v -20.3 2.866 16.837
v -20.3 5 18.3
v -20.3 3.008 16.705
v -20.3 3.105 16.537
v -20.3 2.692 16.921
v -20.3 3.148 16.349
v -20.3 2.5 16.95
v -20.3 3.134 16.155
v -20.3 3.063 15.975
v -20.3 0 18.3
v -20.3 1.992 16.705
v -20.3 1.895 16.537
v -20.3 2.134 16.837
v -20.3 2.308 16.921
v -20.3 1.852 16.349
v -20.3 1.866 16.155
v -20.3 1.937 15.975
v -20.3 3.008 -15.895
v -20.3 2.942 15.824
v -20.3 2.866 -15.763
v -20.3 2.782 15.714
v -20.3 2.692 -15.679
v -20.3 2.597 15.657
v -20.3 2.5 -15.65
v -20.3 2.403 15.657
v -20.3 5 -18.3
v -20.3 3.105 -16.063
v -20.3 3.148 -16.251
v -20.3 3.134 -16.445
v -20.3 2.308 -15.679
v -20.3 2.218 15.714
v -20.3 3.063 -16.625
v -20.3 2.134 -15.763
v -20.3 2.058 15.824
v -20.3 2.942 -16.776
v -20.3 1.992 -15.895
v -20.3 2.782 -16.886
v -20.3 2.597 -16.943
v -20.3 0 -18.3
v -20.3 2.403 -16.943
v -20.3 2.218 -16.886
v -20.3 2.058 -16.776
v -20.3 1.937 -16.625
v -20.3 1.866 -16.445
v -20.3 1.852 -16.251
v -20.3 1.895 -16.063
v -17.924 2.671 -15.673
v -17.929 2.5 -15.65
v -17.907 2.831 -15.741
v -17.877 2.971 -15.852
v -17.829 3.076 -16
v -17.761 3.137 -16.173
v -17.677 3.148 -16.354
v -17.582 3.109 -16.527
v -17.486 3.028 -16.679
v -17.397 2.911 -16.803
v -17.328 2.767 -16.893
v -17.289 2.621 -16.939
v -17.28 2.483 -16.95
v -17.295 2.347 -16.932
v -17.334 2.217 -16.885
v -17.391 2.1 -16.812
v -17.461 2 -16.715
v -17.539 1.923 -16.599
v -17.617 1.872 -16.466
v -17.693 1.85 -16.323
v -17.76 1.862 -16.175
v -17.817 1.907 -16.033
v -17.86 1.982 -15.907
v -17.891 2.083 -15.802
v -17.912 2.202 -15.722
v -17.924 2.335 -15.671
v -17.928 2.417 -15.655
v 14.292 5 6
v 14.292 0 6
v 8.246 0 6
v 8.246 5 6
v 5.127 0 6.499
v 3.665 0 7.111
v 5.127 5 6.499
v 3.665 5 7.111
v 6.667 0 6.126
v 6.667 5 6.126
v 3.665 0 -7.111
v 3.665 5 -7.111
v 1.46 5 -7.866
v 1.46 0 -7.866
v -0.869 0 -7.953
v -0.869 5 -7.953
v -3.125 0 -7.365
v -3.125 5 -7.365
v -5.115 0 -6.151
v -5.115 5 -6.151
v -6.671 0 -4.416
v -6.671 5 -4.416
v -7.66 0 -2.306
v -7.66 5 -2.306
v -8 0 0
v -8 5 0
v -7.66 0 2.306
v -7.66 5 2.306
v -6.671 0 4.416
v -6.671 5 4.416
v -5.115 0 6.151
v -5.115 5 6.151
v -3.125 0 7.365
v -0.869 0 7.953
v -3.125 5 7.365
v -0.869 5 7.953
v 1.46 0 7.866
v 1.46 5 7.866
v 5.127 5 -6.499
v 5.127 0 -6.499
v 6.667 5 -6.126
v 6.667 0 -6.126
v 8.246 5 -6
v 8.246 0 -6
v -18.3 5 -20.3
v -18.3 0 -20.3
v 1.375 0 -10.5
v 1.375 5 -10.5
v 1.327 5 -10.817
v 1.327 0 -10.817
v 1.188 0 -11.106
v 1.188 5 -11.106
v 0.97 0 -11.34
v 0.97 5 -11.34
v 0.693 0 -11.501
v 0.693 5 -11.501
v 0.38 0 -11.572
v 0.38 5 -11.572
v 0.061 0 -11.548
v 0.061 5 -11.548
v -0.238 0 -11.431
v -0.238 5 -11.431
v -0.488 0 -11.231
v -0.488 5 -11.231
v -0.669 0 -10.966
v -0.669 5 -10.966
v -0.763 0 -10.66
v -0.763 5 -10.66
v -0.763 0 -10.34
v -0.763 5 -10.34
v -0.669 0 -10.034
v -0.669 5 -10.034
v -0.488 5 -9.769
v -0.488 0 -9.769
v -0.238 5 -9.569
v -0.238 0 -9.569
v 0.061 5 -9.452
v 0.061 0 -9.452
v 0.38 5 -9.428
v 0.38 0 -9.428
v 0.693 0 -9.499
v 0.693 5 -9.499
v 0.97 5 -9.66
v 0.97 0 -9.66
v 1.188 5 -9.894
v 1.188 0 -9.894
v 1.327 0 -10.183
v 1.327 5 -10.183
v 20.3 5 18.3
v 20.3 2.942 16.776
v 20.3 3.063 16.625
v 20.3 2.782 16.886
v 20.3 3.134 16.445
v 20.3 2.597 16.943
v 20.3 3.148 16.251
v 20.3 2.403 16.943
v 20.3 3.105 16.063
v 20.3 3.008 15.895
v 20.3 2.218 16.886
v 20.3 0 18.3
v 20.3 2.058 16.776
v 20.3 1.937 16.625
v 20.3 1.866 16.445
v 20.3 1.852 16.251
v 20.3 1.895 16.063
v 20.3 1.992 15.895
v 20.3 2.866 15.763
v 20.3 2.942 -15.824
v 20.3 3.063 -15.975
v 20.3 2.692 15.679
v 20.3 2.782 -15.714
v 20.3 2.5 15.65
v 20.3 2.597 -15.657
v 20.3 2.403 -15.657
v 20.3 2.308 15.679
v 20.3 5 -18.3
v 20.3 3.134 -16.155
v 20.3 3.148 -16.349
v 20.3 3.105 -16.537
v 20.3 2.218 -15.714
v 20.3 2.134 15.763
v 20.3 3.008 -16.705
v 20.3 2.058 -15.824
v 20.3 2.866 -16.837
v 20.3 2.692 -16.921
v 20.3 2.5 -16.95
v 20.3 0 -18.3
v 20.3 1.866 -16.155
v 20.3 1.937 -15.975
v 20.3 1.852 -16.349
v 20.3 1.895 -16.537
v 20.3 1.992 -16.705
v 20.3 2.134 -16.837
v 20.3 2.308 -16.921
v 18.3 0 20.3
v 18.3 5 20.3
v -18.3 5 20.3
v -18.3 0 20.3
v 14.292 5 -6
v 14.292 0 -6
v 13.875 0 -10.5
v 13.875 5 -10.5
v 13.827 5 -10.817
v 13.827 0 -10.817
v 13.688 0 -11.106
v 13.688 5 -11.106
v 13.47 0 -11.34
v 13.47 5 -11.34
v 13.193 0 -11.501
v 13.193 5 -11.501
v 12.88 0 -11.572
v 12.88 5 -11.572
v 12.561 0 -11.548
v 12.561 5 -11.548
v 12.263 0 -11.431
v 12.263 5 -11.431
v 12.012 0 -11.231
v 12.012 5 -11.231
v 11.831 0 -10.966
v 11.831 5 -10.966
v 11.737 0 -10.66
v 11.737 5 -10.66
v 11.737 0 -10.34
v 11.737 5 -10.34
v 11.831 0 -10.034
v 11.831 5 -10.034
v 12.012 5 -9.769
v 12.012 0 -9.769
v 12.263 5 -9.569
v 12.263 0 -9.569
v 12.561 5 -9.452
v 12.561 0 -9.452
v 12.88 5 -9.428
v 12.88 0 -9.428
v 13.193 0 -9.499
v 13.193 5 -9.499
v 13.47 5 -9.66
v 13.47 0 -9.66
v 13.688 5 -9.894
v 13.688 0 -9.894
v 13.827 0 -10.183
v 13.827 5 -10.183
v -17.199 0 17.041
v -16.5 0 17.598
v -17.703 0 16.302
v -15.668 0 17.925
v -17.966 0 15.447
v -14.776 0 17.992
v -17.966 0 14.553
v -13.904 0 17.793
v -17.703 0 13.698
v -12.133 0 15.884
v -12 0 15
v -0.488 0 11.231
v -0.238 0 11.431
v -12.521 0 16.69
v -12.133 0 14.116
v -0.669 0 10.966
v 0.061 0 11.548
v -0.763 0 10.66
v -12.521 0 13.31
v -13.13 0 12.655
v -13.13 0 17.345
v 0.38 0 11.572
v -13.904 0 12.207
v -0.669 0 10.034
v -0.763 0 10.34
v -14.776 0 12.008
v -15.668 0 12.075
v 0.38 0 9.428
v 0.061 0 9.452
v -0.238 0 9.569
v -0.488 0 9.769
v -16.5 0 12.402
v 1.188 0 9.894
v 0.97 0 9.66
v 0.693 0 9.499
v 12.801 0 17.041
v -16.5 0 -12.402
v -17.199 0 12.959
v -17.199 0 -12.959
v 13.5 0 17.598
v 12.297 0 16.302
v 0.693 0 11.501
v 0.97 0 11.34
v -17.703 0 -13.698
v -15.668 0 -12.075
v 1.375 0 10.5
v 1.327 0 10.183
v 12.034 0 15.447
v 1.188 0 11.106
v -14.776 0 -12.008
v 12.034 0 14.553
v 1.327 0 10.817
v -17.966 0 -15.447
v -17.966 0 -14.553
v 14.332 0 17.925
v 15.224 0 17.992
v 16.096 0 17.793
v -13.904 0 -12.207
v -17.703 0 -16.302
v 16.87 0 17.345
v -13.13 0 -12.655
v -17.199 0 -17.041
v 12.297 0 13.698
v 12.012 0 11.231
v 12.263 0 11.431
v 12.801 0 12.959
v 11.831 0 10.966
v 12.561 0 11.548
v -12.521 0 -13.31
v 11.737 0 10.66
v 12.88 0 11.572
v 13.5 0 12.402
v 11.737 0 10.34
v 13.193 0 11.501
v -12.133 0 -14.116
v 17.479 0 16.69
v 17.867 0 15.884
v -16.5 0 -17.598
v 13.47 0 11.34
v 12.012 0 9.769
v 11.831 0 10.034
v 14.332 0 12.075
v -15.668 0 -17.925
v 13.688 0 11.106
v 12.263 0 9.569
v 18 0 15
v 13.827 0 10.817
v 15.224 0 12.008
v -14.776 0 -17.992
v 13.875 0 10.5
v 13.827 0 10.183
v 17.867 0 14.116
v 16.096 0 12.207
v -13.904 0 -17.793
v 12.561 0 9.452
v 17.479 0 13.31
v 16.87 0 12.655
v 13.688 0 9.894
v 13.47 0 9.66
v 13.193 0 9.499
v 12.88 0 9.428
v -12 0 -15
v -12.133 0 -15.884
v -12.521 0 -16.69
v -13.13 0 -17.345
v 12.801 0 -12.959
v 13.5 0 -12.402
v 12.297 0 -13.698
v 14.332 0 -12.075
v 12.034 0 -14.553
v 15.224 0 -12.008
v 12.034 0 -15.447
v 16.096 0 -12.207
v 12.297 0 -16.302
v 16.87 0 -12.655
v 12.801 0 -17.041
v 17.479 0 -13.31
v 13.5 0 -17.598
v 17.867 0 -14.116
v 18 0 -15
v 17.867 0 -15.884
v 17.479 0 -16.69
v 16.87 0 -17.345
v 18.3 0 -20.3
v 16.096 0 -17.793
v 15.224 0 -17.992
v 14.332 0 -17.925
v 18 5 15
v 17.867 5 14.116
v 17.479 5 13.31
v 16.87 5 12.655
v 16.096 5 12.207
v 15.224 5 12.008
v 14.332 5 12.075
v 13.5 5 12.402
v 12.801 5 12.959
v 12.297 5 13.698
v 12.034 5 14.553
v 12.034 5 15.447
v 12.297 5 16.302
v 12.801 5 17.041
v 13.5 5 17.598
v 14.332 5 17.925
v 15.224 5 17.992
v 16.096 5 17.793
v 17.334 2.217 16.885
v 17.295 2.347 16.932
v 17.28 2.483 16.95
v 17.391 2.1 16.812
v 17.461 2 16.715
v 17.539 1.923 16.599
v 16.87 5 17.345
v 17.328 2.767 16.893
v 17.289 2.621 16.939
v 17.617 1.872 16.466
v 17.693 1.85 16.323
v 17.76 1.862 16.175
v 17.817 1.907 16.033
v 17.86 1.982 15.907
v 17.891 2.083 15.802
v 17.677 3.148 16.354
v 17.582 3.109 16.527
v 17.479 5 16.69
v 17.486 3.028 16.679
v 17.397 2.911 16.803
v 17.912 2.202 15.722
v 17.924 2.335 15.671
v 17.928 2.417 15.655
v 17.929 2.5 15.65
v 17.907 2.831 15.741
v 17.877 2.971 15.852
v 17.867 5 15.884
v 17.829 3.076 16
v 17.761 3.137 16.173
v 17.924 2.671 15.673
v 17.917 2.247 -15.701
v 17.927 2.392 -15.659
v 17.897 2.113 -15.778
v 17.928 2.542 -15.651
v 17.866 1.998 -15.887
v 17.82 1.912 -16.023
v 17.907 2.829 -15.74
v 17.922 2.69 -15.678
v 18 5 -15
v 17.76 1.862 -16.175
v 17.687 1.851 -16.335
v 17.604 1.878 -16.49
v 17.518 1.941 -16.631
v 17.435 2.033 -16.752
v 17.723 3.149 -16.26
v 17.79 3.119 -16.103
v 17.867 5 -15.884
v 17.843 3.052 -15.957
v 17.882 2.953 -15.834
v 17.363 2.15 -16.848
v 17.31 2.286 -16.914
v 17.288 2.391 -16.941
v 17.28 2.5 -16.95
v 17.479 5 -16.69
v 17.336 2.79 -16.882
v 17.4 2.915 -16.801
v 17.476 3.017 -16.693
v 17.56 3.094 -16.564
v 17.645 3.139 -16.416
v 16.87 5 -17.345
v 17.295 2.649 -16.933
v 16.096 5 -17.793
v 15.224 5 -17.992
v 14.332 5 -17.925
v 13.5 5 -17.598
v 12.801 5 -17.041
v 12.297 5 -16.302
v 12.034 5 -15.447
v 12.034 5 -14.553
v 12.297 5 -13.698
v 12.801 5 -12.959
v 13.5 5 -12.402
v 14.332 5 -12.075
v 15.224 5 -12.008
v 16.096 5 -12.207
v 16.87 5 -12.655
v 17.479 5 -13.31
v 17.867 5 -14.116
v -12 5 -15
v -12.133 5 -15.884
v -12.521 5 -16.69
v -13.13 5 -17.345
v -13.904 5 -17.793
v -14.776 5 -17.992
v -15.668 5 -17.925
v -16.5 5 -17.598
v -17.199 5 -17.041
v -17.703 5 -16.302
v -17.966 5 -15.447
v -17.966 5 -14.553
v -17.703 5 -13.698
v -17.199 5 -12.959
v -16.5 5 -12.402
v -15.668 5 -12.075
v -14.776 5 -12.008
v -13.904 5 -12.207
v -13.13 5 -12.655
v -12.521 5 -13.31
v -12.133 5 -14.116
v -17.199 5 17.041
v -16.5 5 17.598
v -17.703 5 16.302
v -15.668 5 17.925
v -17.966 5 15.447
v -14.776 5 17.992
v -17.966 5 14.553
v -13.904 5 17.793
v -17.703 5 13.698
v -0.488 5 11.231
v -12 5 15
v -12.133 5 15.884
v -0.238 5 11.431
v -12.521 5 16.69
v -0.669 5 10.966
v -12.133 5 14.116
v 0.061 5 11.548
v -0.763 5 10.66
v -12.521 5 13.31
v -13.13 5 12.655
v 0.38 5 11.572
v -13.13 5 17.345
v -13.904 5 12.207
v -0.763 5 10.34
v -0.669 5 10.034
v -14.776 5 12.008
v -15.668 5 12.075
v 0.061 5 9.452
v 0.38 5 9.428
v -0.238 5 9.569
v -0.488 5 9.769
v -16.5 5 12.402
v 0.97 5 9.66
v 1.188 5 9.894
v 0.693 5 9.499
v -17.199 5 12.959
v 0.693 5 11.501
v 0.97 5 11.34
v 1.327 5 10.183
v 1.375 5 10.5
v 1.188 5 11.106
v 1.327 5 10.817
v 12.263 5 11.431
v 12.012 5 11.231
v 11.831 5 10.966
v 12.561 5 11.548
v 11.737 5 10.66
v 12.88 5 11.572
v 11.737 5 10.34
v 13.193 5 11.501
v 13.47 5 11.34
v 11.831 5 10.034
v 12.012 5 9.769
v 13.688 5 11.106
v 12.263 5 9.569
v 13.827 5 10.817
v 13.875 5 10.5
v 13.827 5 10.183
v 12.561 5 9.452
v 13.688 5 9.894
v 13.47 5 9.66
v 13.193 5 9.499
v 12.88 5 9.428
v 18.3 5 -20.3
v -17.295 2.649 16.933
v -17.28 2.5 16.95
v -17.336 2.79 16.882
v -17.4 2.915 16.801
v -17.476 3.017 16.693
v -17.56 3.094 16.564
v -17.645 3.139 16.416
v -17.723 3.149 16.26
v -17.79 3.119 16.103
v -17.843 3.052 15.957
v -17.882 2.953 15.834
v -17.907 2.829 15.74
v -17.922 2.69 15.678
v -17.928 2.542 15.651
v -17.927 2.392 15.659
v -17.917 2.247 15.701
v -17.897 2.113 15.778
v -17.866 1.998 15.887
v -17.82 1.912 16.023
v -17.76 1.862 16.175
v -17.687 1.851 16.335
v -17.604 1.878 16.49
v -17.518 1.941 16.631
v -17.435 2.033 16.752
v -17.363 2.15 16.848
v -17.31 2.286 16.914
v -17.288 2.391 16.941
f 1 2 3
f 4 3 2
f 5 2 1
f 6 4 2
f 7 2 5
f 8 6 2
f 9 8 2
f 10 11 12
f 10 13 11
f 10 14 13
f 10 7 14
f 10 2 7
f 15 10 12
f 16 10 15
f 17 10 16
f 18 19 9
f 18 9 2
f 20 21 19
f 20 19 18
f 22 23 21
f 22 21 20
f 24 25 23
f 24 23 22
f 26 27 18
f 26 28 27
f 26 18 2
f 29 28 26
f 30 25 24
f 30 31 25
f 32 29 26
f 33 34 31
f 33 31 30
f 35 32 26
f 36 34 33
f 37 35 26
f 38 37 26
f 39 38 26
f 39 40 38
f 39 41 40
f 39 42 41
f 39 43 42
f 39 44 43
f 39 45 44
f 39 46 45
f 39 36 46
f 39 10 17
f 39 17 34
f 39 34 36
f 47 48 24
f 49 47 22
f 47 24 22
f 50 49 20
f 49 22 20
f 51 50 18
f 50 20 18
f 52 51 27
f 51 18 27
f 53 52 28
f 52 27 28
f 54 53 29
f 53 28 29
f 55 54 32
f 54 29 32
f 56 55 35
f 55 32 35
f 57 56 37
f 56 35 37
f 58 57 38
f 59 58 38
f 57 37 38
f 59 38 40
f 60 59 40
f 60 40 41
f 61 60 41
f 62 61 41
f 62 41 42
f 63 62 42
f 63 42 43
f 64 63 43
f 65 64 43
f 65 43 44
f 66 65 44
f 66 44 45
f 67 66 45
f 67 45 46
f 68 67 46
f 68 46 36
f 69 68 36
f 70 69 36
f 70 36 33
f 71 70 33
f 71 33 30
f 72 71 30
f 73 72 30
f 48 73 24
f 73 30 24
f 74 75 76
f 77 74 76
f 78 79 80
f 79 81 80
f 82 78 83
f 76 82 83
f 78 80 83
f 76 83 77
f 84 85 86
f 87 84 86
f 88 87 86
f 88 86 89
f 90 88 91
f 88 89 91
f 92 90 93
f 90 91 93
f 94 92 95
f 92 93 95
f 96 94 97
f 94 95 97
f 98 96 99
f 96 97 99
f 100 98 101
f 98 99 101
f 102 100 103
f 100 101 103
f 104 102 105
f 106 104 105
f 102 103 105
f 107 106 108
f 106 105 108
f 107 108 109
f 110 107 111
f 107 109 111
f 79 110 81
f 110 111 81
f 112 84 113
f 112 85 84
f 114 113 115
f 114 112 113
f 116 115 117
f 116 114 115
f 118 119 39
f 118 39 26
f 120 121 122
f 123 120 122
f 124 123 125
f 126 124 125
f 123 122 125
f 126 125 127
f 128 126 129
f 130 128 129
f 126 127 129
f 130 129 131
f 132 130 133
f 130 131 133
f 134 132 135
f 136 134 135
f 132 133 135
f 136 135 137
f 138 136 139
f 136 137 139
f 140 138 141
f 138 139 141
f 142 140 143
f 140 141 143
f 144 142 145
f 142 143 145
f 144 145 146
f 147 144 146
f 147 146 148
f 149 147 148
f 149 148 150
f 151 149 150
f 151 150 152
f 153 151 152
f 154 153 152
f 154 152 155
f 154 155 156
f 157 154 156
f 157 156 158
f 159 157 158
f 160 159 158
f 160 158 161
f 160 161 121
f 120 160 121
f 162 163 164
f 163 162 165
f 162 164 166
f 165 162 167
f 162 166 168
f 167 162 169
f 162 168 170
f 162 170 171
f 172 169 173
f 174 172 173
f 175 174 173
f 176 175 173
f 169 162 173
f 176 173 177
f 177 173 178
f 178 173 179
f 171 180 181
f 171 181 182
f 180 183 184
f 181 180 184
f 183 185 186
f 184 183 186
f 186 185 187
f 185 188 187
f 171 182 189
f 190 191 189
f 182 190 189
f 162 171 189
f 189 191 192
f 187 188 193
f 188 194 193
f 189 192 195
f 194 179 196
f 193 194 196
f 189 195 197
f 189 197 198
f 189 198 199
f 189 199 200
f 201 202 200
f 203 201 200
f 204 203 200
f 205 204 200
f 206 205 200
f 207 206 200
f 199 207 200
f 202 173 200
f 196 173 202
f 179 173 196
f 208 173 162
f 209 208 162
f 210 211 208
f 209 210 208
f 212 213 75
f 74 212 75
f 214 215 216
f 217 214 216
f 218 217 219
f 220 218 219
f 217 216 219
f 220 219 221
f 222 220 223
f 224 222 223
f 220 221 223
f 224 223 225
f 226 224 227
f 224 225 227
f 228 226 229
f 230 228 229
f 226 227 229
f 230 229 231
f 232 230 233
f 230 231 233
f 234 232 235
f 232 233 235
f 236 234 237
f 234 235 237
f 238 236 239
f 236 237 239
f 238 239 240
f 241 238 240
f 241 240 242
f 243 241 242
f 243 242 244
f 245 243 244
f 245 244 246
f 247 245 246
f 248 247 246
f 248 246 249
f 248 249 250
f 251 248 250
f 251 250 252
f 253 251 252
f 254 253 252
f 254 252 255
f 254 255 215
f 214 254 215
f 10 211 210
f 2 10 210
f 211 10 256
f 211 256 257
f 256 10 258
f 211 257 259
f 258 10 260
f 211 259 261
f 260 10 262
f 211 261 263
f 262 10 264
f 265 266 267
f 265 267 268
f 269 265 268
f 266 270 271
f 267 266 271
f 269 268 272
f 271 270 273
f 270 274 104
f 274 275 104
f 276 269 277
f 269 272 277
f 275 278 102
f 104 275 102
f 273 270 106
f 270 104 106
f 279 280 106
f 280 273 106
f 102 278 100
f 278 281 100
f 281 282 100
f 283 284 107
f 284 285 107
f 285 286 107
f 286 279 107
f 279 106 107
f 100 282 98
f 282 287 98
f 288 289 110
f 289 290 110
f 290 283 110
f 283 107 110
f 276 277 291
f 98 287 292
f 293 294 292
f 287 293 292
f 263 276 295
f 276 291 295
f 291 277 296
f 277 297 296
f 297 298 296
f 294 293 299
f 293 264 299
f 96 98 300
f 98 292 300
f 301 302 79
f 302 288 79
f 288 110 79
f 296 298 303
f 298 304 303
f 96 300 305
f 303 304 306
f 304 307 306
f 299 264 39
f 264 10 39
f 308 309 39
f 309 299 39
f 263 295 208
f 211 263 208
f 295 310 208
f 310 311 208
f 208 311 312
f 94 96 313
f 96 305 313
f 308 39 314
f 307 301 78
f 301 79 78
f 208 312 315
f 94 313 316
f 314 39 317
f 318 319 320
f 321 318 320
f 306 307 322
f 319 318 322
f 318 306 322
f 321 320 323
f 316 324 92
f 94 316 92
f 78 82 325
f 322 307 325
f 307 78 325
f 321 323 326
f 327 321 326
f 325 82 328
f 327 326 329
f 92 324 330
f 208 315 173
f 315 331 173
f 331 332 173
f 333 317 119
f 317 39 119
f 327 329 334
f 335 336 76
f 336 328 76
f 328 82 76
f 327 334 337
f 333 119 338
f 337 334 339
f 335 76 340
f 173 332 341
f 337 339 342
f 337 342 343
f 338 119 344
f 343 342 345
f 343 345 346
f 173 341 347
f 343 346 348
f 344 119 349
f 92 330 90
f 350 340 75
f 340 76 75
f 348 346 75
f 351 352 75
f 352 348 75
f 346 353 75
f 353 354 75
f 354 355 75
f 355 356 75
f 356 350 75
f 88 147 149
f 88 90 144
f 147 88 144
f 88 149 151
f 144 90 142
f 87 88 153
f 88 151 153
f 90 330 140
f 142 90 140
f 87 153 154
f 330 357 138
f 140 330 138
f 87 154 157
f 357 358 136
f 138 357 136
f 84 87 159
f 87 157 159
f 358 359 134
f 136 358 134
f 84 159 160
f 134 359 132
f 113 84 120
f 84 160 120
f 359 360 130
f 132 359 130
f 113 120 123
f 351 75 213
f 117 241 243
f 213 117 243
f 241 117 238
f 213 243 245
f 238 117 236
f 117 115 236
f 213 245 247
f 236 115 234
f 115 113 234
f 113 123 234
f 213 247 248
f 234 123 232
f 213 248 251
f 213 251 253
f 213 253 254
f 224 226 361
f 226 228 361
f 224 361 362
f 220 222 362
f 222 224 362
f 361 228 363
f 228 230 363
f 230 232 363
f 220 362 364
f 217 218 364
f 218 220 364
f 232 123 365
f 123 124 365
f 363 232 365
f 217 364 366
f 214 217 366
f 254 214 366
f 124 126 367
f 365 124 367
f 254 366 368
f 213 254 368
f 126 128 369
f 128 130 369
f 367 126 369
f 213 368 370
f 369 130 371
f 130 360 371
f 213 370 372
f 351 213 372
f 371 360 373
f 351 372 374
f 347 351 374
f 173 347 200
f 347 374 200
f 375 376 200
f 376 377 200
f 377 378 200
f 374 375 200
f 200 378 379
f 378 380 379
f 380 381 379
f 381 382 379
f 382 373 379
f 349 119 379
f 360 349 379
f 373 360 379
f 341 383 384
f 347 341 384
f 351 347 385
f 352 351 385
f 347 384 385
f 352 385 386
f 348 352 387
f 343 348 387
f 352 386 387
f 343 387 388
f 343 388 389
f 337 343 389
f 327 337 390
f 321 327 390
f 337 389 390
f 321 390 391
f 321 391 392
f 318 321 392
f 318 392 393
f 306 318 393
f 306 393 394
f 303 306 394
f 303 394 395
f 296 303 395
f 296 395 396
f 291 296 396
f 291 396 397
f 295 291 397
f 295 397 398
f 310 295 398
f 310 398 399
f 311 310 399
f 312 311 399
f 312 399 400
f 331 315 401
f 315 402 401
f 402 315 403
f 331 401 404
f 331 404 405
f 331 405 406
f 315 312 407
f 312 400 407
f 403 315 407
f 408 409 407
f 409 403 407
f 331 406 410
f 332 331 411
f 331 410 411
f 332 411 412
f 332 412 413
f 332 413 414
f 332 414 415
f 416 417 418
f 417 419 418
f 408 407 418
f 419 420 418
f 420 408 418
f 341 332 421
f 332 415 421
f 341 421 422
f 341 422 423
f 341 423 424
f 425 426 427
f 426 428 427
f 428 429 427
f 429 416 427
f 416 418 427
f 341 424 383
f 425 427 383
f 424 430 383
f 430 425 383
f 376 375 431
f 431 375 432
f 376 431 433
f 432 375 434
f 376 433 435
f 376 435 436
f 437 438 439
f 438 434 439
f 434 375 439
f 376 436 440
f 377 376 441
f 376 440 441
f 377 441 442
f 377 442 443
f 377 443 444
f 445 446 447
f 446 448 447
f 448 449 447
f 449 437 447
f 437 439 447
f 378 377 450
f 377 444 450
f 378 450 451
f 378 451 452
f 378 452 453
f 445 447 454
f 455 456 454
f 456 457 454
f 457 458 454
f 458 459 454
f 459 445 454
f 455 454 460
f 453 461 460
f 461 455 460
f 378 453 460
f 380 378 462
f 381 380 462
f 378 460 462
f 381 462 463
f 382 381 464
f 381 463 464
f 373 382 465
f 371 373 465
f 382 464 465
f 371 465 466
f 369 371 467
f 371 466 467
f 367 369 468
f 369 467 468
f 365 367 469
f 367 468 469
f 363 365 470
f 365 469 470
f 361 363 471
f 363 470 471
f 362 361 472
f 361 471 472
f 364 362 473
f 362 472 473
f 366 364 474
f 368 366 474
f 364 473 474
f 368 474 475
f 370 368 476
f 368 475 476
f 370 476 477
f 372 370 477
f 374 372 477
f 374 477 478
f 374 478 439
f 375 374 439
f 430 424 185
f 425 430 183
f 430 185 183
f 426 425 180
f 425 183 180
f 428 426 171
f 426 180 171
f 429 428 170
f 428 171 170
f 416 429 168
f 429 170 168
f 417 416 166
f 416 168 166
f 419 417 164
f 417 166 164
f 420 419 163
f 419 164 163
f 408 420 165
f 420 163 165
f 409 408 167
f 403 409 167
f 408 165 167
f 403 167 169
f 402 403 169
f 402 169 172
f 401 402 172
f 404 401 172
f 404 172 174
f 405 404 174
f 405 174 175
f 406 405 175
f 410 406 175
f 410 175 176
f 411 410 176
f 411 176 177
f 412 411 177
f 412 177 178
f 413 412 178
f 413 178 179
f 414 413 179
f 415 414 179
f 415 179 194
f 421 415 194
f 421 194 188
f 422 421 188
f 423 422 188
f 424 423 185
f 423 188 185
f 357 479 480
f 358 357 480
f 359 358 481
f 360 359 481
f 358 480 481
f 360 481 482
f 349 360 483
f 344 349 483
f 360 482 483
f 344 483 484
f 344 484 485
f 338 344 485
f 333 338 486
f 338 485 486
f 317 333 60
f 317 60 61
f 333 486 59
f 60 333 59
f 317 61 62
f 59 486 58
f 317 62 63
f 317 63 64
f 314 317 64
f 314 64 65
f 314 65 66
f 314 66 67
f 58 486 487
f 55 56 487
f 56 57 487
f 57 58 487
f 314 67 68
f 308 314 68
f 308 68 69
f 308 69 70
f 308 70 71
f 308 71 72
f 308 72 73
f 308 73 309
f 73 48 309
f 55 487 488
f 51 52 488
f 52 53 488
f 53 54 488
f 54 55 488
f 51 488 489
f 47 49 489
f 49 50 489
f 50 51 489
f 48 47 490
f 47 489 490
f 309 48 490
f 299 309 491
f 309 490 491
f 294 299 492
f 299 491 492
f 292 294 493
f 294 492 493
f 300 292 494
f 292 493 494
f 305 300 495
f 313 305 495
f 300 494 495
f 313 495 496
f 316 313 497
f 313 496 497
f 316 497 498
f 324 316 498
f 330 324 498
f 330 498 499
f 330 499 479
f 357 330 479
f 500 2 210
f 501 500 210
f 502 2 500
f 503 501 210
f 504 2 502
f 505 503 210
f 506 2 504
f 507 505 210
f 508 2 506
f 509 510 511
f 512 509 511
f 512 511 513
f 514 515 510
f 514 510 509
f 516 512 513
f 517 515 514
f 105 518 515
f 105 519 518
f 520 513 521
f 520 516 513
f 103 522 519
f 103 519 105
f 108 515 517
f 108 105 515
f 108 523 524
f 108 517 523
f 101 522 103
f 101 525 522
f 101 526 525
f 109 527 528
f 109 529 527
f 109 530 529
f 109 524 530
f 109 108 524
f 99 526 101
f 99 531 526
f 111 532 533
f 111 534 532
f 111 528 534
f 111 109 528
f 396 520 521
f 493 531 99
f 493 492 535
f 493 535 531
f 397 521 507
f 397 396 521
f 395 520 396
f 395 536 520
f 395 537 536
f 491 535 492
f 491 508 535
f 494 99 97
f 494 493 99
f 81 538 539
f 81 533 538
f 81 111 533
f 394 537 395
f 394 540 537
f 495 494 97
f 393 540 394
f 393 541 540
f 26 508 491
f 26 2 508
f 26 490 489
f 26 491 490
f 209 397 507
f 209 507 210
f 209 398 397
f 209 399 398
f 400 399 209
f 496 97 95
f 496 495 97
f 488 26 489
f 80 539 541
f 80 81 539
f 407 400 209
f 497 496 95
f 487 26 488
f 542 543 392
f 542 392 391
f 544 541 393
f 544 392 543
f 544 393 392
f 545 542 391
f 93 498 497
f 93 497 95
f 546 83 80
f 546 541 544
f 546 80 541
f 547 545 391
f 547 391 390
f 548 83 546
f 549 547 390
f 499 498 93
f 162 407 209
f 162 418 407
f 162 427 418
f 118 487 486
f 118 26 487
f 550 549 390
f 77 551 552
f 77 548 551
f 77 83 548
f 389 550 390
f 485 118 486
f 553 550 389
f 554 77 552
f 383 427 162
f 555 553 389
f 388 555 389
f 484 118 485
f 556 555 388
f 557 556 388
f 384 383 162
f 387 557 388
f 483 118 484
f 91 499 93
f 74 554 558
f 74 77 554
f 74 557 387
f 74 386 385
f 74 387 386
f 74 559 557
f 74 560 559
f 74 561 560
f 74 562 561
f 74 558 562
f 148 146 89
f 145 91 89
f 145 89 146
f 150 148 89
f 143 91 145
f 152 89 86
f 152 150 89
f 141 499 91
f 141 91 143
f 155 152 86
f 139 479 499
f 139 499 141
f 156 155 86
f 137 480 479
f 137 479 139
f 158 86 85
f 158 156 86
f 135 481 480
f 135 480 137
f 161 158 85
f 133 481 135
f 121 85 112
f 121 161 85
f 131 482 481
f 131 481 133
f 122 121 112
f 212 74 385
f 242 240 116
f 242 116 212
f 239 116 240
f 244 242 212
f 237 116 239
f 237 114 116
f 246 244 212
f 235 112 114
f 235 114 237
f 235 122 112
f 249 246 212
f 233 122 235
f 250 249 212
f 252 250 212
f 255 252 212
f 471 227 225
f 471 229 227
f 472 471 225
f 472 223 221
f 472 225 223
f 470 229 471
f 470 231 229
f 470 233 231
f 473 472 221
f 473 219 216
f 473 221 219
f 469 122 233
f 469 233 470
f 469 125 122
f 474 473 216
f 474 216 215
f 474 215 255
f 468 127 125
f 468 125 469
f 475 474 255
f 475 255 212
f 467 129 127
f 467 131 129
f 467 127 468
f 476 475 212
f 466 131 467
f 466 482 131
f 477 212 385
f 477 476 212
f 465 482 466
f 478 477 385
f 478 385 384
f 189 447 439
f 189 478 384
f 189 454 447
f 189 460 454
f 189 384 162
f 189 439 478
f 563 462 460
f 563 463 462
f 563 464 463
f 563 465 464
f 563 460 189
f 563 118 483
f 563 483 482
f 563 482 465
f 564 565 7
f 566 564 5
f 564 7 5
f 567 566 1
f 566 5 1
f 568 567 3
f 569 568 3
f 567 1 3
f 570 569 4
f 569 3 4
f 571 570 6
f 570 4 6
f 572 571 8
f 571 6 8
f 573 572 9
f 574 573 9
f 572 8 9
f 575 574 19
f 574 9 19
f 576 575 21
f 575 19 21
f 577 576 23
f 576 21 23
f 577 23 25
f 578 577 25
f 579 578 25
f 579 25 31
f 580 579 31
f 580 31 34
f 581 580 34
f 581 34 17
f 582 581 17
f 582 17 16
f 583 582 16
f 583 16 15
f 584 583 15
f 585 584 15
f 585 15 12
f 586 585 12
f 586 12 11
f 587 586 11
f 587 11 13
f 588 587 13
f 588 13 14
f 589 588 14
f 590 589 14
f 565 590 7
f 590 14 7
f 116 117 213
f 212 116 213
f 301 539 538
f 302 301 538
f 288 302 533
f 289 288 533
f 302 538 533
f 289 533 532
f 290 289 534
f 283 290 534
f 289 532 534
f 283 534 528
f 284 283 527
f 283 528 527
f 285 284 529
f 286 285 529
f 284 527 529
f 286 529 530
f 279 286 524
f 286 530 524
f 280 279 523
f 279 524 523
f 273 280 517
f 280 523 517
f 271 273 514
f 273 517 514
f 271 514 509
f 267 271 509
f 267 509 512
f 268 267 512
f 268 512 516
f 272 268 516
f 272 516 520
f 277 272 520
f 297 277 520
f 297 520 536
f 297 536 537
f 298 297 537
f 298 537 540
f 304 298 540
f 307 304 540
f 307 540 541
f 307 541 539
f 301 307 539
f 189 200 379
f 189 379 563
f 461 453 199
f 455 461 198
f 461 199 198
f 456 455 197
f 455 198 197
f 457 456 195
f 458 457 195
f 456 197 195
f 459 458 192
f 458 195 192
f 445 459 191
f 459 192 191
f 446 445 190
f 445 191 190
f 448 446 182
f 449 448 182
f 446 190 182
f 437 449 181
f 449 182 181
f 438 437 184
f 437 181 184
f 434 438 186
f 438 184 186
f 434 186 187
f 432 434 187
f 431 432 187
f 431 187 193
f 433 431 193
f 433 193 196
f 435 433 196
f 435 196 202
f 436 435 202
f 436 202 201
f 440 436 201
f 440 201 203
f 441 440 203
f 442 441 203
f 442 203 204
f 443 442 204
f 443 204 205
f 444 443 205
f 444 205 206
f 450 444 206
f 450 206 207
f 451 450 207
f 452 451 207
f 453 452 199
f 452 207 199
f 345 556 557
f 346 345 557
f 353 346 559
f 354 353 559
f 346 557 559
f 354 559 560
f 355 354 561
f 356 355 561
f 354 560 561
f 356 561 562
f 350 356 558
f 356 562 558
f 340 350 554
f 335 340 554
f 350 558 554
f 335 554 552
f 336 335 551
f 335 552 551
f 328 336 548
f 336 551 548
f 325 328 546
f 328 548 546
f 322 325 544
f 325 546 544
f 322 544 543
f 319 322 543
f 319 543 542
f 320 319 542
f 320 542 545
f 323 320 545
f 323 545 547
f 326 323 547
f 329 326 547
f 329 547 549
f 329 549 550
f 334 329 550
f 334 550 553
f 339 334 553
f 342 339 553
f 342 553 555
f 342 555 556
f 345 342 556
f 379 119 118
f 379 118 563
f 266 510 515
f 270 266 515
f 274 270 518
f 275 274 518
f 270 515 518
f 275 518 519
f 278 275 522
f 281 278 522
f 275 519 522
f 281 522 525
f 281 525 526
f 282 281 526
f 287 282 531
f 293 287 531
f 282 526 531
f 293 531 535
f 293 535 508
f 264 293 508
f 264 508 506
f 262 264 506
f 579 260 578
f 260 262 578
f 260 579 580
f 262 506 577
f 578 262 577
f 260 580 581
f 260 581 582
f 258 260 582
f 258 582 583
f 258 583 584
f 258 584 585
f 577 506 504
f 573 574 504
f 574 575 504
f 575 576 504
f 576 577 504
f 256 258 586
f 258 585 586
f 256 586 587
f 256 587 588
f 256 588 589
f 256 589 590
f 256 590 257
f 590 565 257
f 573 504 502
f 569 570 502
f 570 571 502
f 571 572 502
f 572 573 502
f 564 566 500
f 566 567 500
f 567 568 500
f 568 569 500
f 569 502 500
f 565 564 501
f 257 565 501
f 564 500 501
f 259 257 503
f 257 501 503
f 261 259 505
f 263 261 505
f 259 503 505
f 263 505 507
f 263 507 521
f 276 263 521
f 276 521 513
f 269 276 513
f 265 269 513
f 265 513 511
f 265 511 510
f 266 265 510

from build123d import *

# Parameters (mm, degrees)
SKETCH1_W           = 40.6
SKETCH1_H           = 40.6
BOSS_EXTRUDE1_DEPTH = 5
SKETCH2_R           = 8
CUT_EXTRUDE1_DEPTH  = 5
CUT_EXTRUDE3_DEPTH  = 6
SKETCH5_R           = 3
CUT_EXTRUDE4_DEPTH  = 10
CHAMFER1_SIZE       = 2
SKETCH6_R           = 0.65
CUT_EXTRUDE5_DEPTH  = 5
SKETCH7_R           = 0.65
CUT_EXTRUDE6_DEPTH  = 5
SKETCH8_R           = 1.075
CUT_EXTRUDE7_DEPTH  = 10
FILLET1_R           = 10


with BuildPart() as part:
    # Sketch1 → Boss-Extrude1 (new body)
    with BuildSketch(Plane(origin=(0, 0, 0), x_dir=(1, 0, 0), z_dir=(0, 1, 0))):
        Rectangle(SKETCH1_W, SKETCH1_H)
    extrude(amount=BOSS_EXTRUDE1_DEPTH)

    # Sketch2 → Cut-Extrude1 (cut)
    with BuildSketch(Plane(origin=(0, 5, 0), x_dir=(1, 0, 0), z_dir=(0, 1, 0))):
        Circle(SKETCH2_R)
    extrude(amount=-CUT_EXTRUDE1_DEPTH, mode=Mode.SUBTRACT)

    # Sketch4 → Cut-Extrude3 (cut, through all)
    with BuildSketch(Plane(origin=(0, 0, 0), x_dir=(-1, 0, 0), z_dir=(0, -1, 0))):
        Polygon((-5.291502622, 6), (-14.291502622, 6), (-14.291502622, 0), (-14.291502622, -6), (-5.291502622, -6), align=None)
    extrude(amount=-CUT_EXTRUDE3_DEPTH, mode=Mode.SUBTRACT)

    # Sketch5 → Cut-Extrude4 (cut)
    with BuildSketch(Plane(origin=(0, 5, 0), x_dir=(1, 0, 0), z_dir=(0, 1, 0))):
        with Locations((15, 15)):
            Circle(SKETCH5_R)
        with Locations((15, -15)):
            Circle(SKETCH5_R)
        with Locations((-15, -15)):
            Circle(SKETCH5_R)
        with Locations((-15, 15)):
            Circle(SKETCH5_R)
    extrude(amount=-CUT_EXTRUDE4_DEPTH, mode=Mode.SUBTRACT)

    # Chamfer1
    chamfer1_edges = [part.edges().sort_by_distance(p)[0] for p in [
        (20.3, 2.5, 20.3),
        (-20.3, 2.5, 20.3),
        (-20.3, 2.5, -20.3),
        (20.3, 2.5, -20.3),
    ]]
    chamfer(chamfer1_edges, length=CHAMFER1_SIZE)

    # Sketch6 → Cut-Extrude5 (cut)
    with BuildSketch(Plane.ZY.offset(20.3)):
        with Locations((-16.3, 2.5)):
            Circle(SKETCH6_R)
        with Locations((16.3, 2.5)):
            Circle(SKETCH6_R)
    extrude(amount=-CUT_EXTRUDE5_DEPTH, mode=Mode.SUBTRACT)

    # Sketch7 → Cut-Extrude6 (cut)
    with BuildSketch(Plane(origin=(20.3, 0, 0), x_dir=(0, 0, -1), z_dir=(1, 0, 0))):
        with Locations((16.3, 2.5)):
            Circle(SKETCH7_R)
        with Locations((-16.3, 2.5)):
            Circle(SKETCH7_R)
    extrude(amount=-CUT_EXTRUDE6_DEPTH, mode=Mode.SUBTRACT)

    # Sketch8 → Cut-Extrude7 (cut)
    with BuildSketch(Plane(origin=(0, 5, 0), x_dir=(1, 0, 0), z_dir=(0, 1, 0))):
        with Locations((0.3, -10.5)):
            Circle(SKETCH8_R)
        with Locations((12.8, -10.5)):
            Circle(SKETCH8_R)
        with Locations((0.3, 10.5)):
            Circle(SKETCH8_R)
        with Locations((12.8, 10.5)):
            Circle(SKETCH8_R)
    extrude(amount=-CUT_EXTRUDE7_DEPTH, mode=Mode.SUBTRACT)

    # Fillet1
    fillet1_edges = [part.edges().sort_by_distance(p)[0] for p in [
        (5.291502622, 2.5, -6),
        (5.291502622, 2.5, 6),
    ]]
    fillet(fillet1_edges, radius=FILLET1_R)


solid = part.part
